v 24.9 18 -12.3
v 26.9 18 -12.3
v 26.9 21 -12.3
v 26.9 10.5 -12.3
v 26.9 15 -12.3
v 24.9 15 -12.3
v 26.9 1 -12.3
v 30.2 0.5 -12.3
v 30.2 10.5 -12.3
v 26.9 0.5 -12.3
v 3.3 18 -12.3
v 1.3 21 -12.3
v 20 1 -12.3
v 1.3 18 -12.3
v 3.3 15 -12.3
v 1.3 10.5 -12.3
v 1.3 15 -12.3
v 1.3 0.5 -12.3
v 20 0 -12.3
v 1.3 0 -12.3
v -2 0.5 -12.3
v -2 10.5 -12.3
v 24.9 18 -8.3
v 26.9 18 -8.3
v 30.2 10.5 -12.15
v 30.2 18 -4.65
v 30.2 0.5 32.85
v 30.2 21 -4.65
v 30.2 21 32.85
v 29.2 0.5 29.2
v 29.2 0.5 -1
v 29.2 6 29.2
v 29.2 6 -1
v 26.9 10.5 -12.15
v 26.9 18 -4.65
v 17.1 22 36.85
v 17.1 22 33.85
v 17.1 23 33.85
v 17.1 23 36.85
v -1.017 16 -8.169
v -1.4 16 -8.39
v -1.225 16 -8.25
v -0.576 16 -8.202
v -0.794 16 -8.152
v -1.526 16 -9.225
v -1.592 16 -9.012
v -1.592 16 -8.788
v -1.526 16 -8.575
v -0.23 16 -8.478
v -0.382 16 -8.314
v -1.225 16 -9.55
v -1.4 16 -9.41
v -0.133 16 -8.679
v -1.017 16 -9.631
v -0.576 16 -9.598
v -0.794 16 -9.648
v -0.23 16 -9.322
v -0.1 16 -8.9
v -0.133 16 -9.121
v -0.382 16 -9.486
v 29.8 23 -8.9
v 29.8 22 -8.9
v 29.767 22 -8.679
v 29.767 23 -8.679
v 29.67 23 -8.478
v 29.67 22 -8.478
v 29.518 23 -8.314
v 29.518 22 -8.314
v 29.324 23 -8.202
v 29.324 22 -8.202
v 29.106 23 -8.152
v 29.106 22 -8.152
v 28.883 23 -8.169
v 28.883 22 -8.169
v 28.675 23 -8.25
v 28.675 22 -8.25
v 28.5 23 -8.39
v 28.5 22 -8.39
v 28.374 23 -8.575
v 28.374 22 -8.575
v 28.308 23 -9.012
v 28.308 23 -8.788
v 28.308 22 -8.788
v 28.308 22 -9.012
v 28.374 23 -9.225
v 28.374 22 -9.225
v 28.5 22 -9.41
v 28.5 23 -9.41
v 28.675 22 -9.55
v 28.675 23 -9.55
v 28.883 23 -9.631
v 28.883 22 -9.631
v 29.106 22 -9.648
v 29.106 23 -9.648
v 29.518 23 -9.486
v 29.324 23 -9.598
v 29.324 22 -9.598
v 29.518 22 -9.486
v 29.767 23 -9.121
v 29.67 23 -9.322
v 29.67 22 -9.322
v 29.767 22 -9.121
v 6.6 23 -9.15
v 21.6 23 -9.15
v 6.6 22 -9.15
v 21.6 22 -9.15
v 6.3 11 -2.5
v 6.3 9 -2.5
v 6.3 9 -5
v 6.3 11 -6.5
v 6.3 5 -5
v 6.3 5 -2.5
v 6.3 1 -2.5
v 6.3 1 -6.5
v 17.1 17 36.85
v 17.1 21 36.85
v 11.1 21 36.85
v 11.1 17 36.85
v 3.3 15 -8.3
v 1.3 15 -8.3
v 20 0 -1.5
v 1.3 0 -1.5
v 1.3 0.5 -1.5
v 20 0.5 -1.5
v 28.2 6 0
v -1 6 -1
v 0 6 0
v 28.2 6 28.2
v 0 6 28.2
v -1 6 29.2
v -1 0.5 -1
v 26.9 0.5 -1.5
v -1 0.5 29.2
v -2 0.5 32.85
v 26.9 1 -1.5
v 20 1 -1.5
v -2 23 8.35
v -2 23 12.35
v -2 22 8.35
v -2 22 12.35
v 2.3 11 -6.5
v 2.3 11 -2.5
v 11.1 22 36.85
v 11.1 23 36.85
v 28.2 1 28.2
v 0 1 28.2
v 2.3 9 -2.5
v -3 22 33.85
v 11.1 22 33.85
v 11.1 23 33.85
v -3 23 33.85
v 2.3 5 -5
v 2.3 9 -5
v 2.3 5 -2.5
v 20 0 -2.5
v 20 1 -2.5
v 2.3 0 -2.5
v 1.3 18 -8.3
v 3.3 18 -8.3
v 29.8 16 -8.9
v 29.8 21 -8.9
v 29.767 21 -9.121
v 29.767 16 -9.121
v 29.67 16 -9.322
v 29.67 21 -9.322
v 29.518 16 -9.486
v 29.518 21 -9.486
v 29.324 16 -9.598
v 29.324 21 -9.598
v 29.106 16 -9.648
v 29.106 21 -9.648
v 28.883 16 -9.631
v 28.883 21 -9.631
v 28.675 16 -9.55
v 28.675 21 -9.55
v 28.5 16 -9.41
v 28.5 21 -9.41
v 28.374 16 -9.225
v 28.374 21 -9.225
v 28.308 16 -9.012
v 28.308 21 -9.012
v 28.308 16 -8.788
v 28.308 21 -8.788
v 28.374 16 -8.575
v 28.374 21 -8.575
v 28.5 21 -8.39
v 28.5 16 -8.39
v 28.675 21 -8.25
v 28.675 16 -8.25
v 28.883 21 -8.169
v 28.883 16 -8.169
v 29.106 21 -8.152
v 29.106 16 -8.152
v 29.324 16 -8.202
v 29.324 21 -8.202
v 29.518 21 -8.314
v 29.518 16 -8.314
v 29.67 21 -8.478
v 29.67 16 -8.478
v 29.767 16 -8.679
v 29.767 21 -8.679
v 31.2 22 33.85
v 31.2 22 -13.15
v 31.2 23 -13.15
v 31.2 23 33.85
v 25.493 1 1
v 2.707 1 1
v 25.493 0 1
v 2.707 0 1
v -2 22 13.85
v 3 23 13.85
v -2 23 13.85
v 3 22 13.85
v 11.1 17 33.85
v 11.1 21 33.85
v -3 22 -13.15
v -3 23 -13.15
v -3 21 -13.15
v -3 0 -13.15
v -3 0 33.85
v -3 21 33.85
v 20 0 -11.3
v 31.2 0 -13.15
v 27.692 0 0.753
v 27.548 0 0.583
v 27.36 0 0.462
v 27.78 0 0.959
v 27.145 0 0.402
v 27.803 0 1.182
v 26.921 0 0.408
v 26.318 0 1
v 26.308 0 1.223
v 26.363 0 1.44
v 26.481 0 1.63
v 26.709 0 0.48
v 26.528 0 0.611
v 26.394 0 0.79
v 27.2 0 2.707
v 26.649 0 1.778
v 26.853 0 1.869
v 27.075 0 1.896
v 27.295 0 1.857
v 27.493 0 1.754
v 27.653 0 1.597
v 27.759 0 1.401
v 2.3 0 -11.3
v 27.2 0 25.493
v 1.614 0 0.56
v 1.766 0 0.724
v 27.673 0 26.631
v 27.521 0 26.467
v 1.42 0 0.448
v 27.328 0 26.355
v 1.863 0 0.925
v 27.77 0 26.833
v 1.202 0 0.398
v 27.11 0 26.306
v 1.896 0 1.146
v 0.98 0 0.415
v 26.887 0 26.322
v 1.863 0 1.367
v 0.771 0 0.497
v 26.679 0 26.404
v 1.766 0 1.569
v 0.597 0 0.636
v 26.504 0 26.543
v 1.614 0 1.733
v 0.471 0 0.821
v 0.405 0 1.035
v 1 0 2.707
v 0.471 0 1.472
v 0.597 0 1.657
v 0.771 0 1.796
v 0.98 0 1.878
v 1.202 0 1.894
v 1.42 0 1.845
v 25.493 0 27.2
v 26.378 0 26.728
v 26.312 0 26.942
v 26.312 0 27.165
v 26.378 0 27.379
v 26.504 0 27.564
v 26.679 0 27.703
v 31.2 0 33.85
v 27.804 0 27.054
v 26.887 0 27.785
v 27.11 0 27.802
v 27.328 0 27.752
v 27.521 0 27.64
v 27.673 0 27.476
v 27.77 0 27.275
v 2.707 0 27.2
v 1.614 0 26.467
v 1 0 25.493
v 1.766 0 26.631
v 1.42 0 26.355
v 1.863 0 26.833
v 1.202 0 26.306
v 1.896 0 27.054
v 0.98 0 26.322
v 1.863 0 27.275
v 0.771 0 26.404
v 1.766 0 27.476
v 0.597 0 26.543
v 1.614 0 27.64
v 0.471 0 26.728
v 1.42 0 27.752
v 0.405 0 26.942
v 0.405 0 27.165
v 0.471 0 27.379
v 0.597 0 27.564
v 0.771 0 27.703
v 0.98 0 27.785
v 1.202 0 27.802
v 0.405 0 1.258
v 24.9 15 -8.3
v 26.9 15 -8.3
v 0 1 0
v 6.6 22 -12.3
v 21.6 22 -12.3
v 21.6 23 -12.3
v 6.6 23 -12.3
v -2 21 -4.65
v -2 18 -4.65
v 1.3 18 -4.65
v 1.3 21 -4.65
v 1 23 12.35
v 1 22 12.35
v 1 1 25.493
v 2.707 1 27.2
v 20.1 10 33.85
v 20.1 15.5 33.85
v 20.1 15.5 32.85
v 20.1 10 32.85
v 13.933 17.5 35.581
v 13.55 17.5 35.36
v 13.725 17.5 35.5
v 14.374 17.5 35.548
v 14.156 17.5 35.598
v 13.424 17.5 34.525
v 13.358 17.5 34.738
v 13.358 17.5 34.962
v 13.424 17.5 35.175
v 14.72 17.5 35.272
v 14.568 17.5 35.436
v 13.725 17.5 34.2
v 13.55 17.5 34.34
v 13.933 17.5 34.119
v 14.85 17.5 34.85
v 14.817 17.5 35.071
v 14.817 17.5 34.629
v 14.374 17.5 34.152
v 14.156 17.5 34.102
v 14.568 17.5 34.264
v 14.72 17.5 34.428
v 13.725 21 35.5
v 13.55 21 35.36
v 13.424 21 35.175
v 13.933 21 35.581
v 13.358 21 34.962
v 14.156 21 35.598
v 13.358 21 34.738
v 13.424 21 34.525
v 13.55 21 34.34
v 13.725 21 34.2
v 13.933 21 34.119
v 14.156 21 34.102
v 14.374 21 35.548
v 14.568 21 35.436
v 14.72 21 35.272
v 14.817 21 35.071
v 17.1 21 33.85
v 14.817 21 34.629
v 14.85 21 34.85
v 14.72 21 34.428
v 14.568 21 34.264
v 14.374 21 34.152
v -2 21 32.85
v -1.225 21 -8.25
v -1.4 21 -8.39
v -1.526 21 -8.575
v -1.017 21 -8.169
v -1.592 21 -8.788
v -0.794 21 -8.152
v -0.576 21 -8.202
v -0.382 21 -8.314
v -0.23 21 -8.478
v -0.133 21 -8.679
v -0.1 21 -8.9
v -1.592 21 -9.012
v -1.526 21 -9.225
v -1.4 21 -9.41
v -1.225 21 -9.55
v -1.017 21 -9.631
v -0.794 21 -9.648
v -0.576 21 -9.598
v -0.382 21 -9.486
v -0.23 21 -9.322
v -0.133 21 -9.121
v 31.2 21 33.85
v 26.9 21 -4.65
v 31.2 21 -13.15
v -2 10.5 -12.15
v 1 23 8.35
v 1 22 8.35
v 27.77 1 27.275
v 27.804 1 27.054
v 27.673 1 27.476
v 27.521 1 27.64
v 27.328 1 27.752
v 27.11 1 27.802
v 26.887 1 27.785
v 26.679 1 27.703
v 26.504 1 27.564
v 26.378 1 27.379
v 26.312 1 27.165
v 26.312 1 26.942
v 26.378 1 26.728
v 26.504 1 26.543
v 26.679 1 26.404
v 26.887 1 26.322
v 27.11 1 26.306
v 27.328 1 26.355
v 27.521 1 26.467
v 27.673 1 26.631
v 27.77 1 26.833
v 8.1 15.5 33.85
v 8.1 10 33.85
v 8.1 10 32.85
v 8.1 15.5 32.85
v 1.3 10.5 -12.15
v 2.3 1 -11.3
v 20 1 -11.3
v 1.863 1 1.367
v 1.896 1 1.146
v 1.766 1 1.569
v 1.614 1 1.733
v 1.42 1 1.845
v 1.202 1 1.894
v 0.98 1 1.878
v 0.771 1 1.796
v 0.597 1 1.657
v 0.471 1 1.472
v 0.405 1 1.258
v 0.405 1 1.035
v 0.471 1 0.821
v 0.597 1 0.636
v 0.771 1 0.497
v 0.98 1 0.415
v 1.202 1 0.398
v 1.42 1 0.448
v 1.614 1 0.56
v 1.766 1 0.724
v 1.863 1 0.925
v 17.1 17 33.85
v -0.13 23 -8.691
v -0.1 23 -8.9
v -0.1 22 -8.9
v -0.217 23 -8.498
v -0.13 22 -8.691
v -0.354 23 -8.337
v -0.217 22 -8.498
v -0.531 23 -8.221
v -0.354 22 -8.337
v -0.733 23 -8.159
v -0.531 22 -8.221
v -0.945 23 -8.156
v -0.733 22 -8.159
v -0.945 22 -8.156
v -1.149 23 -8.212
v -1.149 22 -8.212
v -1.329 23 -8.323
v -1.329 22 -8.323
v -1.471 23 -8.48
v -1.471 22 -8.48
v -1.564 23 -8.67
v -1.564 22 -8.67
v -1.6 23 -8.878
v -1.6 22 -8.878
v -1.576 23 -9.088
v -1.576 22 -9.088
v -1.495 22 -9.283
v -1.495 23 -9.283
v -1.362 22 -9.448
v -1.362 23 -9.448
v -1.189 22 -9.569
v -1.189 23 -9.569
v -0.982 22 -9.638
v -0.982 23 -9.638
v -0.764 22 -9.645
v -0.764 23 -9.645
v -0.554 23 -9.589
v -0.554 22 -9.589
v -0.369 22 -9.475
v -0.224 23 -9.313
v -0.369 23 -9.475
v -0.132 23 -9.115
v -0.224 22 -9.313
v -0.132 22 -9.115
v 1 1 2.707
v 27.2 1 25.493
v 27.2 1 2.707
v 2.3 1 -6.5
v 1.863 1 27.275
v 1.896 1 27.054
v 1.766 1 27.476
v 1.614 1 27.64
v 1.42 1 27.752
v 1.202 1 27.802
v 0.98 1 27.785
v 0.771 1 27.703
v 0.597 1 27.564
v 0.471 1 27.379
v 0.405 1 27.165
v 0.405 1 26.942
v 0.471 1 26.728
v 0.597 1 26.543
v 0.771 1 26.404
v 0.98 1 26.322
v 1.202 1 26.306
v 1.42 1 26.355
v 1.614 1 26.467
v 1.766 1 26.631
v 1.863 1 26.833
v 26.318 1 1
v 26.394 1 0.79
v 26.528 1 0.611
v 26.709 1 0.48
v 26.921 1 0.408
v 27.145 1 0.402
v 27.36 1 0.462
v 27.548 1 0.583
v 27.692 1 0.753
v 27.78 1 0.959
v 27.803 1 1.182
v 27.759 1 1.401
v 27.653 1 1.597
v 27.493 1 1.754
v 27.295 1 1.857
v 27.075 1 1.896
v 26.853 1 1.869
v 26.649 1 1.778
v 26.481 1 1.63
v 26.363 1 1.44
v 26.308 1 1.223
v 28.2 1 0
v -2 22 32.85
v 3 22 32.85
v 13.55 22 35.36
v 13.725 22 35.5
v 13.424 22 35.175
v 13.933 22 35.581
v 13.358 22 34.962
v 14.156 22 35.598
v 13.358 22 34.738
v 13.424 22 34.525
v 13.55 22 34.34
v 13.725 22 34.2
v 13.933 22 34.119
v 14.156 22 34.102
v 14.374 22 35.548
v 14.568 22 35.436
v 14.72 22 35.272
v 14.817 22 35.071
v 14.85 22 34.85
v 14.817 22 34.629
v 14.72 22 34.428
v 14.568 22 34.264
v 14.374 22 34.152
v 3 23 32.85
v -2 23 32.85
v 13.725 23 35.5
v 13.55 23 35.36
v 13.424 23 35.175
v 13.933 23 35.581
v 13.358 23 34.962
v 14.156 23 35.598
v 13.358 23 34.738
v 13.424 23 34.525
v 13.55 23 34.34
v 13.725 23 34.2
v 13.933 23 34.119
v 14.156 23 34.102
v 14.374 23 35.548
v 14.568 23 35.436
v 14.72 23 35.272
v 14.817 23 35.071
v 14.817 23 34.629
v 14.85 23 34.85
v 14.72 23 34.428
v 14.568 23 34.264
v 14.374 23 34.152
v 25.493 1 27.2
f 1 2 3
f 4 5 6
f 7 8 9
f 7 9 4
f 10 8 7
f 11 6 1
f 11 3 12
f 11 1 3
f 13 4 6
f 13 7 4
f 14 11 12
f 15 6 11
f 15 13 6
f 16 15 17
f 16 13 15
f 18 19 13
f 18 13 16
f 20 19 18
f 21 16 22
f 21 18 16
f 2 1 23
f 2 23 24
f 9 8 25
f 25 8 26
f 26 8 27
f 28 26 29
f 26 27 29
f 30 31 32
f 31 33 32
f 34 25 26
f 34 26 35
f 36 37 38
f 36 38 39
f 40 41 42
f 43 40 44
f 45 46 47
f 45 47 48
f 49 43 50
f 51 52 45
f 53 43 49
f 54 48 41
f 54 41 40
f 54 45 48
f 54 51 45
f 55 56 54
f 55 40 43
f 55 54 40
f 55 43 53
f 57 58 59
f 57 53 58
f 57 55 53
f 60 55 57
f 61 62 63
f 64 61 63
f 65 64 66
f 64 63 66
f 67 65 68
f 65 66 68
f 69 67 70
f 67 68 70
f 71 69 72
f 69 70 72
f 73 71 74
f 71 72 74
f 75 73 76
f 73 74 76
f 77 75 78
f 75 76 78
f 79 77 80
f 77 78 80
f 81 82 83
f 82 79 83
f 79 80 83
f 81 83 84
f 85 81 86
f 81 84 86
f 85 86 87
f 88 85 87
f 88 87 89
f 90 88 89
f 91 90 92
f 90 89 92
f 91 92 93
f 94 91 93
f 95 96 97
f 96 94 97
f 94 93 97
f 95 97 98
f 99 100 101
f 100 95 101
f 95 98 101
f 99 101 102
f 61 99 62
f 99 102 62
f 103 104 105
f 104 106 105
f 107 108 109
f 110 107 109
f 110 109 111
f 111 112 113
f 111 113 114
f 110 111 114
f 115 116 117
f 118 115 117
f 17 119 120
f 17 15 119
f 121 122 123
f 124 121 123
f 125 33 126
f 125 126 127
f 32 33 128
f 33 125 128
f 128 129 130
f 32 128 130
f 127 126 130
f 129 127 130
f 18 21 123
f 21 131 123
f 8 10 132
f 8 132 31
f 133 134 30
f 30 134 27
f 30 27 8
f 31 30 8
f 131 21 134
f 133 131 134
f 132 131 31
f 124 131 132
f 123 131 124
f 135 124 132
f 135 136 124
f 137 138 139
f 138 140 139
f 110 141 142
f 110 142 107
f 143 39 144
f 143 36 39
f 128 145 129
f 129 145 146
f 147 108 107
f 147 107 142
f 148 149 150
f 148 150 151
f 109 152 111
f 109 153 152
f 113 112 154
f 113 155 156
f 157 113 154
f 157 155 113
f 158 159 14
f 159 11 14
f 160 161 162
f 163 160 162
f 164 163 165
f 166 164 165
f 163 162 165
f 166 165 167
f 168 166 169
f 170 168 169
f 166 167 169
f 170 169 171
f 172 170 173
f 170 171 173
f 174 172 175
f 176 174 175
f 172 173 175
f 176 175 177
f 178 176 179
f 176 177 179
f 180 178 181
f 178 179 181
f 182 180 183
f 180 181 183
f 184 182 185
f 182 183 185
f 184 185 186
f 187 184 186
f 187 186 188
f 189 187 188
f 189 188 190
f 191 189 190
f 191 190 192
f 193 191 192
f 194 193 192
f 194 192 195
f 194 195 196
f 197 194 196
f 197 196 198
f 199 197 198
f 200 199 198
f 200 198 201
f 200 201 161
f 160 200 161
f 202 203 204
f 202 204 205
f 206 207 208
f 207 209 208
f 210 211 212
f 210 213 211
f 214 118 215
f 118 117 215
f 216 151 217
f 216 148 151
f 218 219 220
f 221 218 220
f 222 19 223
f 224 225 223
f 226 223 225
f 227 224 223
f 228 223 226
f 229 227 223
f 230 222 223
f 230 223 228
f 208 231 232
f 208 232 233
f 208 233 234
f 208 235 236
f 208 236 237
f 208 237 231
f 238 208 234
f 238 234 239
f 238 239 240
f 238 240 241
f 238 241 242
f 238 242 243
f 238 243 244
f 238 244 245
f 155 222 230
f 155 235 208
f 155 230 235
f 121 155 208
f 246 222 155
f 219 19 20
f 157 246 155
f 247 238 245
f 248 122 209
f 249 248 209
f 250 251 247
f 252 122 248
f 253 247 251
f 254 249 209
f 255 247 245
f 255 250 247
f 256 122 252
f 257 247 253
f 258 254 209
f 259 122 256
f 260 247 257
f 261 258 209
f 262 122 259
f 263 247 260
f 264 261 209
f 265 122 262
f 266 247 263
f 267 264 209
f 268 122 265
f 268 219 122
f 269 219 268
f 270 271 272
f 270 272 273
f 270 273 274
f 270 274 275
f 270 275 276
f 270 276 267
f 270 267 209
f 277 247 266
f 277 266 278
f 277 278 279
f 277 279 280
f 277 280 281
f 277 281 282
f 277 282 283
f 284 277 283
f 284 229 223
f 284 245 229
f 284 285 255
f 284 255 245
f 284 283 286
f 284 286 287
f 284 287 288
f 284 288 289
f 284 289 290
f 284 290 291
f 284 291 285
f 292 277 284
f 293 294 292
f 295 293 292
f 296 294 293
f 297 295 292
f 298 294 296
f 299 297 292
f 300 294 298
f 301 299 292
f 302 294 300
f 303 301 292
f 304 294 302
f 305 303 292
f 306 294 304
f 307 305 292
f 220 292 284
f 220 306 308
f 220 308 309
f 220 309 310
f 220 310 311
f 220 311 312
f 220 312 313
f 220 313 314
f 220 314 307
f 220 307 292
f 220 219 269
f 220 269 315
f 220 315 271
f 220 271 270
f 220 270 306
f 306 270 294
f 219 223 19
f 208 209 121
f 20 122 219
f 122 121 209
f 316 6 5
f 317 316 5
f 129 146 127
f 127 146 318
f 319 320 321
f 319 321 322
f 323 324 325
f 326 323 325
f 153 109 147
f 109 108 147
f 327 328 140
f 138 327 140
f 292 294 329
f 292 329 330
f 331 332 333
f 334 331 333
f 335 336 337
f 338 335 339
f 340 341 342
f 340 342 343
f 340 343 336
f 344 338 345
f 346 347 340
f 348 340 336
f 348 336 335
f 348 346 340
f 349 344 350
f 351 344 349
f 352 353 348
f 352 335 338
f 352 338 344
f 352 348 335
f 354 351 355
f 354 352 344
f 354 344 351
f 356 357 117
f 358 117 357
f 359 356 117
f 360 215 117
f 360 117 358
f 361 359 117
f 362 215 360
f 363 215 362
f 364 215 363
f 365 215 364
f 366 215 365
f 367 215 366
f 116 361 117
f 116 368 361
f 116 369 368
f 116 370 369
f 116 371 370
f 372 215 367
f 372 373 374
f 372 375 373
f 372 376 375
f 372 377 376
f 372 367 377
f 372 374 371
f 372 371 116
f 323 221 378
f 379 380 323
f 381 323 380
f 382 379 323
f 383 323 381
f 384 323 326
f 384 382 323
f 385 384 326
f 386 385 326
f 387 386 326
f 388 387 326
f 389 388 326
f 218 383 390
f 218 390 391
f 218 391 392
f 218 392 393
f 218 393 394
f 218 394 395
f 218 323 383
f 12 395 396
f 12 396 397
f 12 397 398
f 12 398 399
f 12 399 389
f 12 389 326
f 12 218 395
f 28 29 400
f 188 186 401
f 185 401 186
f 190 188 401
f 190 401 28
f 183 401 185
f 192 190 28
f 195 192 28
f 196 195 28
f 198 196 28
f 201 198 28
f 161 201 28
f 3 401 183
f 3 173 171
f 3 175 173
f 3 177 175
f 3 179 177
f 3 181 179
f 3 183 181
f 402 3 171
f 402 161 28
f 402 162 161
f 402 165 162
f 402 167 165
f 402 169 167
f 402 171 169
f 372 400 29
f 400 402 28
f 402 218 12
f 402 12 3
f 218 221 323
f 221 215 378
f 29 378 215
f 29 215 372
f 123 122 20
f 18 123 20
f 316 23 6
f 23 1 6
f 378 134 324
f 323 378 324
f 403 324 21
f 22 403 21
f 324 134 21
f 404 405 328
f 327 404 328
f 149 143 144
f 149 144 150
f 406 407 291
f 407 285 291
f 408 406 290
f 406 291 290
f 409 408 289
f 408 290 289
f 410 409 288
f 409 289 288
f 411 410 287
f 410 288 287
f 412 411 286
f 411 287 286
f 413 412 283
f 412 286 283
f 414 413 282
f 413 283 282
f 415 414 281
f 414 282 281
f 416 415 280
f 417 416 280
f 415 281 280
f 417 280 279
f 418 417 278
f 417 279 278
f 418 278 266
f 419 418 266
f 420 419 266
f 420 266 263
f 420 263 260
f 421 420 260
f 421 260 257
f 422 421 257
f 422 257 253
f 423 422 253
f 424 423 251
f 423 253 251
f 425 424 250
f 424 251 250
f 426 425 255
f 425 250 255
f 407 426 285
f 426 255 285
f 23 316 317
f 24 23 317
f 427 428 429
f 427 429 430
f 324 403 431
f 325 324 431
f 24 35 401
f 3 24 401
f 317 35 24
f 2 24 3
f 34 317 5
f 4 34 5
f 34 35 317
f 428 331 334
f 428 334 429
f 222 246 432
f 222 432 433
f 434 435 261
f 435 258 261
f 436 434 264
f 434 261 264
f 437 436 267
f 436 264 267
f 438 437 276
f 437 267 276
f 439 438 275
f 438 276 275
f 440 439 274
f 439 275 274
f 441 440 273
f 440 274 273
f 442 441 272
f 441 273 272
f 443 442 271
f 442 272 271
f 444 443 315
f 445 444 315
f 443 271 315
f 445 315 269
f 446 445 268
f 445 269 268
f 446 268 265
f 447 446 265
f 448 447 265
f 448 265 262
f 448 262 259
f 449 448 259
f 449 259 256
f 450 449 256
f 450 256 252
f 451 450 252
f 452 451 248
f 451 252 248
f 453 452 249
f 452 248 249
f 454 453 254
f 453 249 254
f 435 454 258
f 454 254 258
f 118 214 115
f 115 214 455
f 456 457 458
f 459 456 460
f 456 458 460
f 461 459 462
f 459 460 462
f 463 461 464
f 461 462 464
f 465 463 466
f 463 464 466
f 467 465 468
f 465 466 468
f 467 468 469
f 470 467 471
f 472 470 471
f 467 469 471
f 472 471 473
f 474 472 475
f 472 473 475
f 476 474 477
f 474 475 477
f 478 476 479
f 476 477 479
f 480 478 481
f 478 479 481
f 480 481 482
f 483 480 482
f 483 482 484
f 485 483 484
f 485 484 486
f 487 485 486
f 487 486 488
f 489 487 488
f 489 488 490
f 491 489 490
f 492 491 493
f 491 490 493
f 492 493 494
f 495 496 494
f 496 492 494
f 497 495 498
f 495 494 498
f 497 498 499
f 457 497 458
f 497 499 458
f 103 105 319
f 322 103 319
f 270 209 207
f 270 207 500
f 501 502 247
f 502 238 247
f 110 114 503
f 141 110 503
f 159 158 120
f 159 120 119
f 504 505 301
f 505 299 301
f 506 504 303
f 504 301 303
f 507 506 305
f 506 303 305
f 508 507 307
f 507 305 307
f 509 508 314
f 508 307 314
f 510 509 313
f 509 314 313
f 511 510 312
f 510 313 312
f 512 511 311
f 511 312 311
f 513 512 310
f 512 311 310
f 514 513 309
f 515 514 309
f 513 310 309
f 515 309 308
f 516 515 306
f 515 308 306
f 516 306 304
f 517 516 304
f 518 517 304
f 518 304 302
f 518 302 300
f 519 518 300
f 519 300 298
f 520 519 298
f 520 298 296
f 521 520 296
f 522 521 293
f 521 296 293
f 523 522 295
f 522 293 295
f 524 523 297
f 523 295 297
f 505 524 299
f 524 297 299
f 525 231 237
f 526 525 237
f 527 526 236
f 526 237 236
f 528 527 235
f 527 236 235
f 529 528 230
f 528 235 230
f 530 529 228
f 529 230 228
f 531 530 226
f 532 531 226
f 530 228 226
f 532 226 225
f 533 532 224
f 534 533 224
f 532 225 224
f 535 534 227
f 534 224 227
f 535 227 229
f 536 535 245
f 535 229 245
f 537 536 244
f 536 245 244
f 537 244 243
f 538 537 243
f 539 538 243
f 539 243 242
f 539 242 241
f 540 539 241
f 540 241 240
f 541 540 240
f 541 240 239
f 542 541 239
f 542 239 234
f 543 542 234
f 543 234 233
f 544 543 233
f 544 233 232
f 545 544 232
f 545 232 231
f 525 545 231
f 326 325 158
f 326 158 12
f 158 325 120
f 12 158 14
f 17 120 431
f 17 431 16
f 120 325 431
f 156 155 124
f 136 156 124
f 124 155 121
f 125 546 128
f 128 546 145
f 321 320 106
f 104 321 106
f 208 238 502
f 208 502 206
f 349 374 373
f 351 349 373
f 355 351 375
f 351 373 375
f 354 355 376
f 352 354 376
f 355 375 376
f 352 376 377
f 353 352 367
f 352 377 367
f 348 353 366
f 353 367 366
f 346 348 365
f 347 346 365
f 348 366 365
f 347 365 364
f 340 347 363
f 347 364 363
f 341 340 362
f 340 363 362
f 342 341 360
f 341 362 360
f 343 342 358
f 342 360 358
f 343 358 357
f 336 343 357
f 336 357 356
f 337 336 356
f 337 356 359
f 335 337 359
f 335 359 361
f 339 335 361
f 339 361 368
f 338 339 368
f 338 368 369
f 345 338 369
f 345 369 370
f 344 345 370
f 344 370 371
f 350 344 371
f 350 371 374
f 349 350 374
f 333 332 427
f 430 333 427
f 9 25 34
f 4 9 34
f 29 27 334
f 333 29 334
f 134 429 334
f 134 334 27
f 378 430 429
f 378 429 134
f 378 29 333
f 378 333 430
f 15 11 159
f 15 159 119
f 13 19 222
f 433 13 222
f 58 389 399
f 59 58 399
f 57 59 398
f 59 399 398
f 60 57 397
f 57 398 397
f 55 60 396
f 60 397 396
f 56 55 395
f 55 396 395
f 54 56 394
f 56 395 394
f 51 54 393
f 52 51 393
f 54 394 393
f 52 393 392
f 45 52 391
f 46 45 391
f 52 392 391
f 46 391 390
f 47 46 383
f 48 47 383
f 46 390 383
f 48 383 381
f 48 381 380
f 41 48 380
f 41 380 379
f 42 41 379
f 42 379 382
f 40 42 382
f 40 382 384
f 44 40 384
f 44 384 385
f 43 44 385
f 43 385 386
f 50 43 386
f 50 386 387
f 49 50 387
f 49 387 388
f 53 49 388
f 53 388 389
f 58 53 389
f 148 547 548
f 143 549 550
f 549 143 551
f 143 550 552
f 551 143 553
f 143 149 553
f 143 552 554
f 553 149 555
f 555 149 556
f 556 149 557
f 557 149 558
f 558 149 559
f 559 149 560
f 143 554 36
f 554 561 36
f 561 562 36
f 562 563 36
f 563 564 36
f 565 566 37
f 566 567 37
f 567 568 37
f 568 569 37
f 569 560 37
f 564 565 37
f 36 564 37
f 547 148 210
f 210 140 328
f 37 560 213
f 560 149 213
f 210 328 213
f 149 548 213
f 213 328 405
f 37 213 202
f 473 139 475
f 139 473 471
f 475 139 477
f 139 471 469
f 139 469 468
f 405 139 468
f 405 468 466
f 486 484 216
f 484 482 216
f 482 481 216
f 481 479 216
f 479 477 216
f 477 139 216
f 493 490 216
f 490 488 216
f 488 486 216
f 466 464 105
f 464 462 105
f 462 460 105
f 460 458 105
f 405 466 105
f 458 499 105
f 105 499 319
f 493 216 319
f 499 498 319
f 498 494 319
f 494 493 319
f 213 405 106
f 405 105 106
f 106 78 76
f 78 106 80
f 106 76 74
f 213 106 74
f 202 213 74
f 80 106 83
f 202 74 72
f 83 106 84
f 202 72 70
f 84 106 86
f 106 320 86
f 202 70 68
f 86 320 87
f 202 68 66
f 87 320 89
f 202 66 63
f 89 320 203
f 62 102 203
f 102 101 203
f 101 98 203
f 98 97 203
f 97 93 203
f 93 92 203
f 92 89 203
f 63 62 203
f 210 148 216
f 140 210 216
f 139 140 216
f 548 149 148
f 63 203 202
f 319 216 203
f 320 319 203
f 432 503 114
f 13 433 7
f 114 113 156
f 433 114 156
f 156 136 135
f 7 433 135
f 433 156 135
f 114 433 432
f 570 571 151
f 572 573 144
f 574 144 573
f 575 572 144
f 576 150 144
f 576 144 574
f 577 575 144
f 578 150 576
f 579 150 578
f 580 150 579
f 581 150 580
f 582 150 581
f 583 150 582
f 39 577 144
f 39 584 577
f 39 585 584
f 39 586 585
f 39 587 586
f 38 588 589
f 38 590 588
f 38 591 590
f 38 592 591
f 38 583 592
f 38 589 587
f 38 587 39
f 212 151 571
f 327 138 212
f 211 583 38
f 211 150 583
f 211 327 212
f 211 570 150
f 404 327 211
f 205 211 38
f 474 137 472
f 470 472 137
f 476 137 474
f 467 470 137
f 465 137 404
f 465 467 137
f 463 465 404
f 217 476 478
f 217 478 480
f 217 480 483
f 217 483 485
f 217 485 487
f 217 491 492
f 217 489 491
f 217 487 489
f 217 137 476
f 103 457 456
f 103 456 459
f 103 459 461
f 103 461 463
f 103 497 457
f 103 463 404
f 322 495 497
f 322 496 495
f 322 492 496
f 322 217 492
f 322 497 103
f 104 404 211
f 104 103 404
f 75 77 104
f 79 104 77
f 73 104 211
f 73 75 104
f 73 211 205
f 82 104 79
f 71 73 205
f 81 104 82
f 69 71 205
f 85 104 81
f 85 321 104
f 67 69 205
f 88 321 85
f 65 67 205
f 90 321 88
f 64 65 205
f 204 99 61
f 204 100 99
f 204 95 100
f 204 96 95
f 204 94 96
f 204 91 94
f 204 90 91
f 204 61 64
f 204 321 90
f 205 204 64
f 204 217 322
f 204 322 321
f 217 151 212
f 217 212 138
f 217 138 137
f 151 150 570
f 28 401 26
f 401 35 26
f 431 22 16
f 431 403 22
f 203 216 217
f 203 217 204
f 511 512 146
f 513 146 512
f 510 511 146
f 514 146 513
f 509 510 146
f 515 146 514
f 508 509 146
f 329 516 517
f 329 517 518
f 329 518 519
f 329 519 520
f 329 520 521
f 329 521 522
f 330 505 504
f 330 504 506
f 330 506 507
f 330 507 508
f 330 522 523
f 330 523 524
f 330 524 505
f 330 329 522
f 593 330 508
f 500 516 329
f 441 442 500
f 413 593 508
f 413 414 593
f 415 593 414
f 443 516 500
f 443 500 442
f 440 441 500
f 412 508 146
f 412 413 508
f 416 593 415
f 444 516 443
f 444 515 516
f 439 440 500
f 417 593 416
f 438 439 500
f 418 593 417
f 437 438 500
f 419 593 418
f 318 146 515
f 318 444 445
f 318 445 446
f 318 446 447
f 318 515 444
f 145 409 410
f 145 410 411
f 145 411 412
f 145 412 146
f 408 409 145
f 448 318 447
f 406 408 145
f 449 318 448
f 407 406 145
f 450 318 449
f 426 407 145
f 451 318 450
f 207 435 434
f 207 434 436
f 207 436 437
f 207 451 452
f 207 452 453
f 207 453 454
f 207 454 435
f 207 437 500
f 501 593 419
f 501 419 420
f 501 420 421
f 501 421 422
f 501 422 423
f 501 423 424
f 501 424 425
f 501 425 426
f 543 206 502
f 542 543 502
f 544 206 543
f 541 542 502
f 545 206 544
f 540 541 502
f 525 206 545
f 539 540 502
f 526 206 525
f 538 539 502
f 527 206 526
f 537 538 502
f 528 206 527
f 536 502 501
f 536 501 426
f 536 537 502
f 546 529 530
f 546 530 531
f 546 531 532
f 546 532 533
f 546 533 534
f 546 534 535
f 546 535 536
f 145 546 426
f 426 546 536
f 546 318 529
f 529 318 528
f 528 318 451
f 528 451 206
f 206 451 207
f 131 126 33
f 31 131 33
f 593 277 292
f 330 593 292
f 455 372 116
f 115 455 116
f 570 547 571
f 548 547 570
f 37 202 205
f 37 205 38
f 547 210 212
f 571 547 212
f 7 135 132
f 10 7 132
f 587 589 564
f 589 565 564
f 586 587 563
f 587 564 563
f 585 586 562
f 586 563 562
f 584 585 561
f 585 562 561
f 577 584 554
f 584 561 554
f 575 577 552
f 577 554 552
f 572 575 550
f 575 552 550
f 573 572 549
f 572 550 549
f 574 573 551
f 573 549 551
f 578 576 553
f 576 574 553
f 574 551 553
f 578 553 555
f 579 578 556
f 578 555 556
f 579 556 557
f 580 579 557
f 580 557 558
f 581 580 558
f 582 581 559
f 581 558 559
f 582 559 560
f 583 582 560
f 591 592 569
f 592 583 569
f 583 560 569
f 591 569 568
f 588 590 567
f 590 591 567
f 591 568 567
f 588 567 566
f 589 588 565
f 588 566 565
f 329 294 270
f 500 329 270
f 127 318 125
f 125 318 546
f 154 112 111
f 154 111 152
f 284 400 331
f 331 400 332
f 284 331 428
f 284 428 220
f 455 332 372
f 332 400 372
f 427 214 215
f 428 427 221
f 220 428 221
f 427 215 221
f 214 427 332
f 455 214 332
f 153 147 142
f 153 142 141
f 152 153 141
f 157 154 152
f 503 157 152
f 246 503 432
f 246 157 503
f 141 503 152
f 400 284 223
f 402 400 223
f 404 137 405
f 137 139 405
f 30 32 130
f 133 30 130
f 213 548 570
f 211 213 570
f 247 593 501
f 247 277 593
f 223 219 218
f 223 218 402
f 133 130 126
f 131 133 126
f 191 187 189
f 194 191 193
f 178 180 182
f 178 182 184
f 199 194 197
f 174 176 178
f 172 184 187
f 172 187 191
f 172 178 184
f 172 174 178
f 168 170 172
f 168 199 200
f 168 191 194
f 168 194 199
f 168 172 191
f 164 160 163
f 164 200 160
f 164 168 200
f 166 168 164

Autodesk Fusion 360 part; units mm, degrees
sketch "Sketch1" plane through (0, 0, 0) normal (0, 1, 0) x (1, 0, 0)
  line L0 (0, 0) -> (28.2, 0)
  line L1 (28.2, 0) -> (28.2, -28.2)
  line L2 (28.2, -28.2) -> (0, -28.2)
  line L3 (0, -28.2) -> (0, 0)
  line L4 (29.7, -29.7) -> (-1.5, -29.7)
  line L5 (-1.5, -29.7) -> (-1.5, 1.5)
  line L6 (-1.5, 1.5) -> (29.7, 1.5)
  line L7 (29.7, 1.5) -> (29.7, -29.7)
  line L8 (26.7, -1.5) -> (26.3464, -1.8536) construction
  line L9 (26.3464, -1.8536) -> (26.7, -2.2071) construction
  line L10 (26.7, -2.2071) -> (25.9929, -1.5)
  line L11 (26.7, -1.5) -> (27.0536, -1.1464) construction
  circle A0 centre (27.0536, -1.1464) radius 0.75
  line L12 (26.7, -26.7) -> (1.5, -1.5) construction
  line L13 (1.5, -26.7) -> (26.7, -1.5) construction
  circle A1 centre (1.1464, -1.1464) radius 0.75
  circle A2 centre (1.1464, -27.0536) radius 0.75
  circle A3 centre (27.0536, -27.0536) radius 0.75
  line L14 (27.2, -27.2) -> (1, -27.2)
  line L15 (1, -27.2) -> (1, -1)
  line L16 (1, -1) -> (27.2, -1)
  line L17 (27.2, -1) -> (27.2, -27.2)
  line L18 (27.2, -2.7071) -> (25.4929, -1)
  line L19 (2.7071, -1) -> (1, -2.7071)
  line L20 (1, -25.4929) -> (2.7071, -27.2)
  line L21 (25.4929, -27.2) -> (27.2, -25.4929)
  dimension "d1" = 28.2
  dimension "d2" = 28.2
  dimension "d5" = 1.5
  dimension "d12" = 1.5
  dimension "d15" = 1
  dimension "d17" = 360
extrude "Extrude1" add sketch "Sketch1" along normal blind 1 contours L0 L1 L2 L3 | L4 L5 L6 L7 | A3 L14 L17 L21 | A1 L15 L16 L19 | A2 L14 L15 L20 makes body 1
extrude "Extrude2" add sketch "Sketch1" along normal blind 5 contours L4 L5 L6 L7 bodies 1
extrude "Extrude3" add sketch "Sketch1" along normal blind 1 contours L10 A0 L16 L17 L18 bodies 1
extrude "Extrude4" add 1 faces at (-1, 5, 9.4) along direction (0, 1, 0) blind 1 on bodies 1 bodies 1
ref_plane "WorkPlane1" through (14.1, 6, 14.1) normal (0, 1, 0) x (0, 0, 1)
sketch "Sketch2" plane through (14.1, 6, 14.1) normal (0, 1, 0) x (1, 0, 0)
  line L0 (15.6, -15.6) -> (-15.6, -15.6)
  line L1 (15.6, -15.6) -> (15.6, -26) construction
  line L2 (15.6, -18.25) -> (-15.6, -18.25)
  line L3 (-15.6, -18.25) -> (-15.6, 18.25)
  line L4 (-15.6, 18.25) -> (15.6, 18.25)
  line L5 (15.6, 18.25) -> (15.6, -18.25)
  line L6 (15.6, -18.25) -> (-15.6, 18.25) construction
  line L7 (-15.6, -18.25) -> (15.6, 18.25) construction
  line L8 (16.1, -18.75) -> (-16.1, -18.75)
  line L9 (-16.1, -18.75) -> (-16.1, 18.75)
  line L10 (-16.1, 18.75) -> (16.1, 18.75)
  line L11 (16.1, 18.75) -> (16.1, -18.75)
  line L12 (17.1, -19.75) -> (-17.1, -19.75)
  line L13 (-17.1, -19.75) -> (-17.1, 19.75)
  line L14 (-17.1, 19.75) -> (17.1, 19.75)
  line L15 (17.1, 19.75) -> (17.1, -19.75)
  line L16 (-12.8, 25.4) -> (-12.8, -15.6)
  line L17 (-12.8, -15.6) -> (12.8, -15.6)
  line L18 (12.8, -15.6) -> (12.8, 25.4)
  line L19 (17.1, 19.75) -> (-17.1, 19.75)
  line L20 (-17.1, 19.75) -> (-17.1, 27.25)
  line L21 (-17.1, 27.25) -> (17.1, 27.25)
  line L22 (17.1, 27.25) -> (17.1, 19.75)
  line L23 (-12.8, 25.4) -> (12.8, 25.4)
  line L24 (12.8, 25.4) -> (12.8, 26.4)
  line L25 (12.8, 26.4) -> (-12.8, 26.4)
  line L26 (-12.8, 26.4) -> (-12.8, 25.4)
  dimension "d27" = 31.2
  dimension "d28" = 36.5
  dimension "d29" = 0.5
  dimension "d30" = 1.5
  dimension "d33" = 41
  dimension "d34" = 25.6
  dimension "d35" = 7.5
  dimension "d36" = 1
extrude "Extrude5" add sketch "Sketch2" against normal blind 6 separate body contours L8 L9 L10 L11 L12 L13 L14 L15 L16 L18 L19 | L14 L16 L18 L19 L20 L21 L22 L24 L25 L26 makes body 2
extrude "Extrude6" add 1 faces at (-1.5667, 6, -10.0333) along direction (0, 1, 0) blind 13 on bodies 2 bodies 2
extrude "Extrude7" add 1 faces at (-1.5, 2, 19.3) along direction (-1, 0, 0) blind 1.5 on bodies 1 bodies 1 2
extrude "Extrude8" add 1 faces at (29.7, 4, 19.3) along direction (1, 0, 0) blind 1.5 on bodies 1 bodies 1
ref_plane "WorkPlane2" through (14.1, 0, 10.35) normal (0, -1, 0) x (-1, 0, 0)
sketch "Sketch3" plane through (14.1, 0, 10.35) normal (0, -1, 0) x (1, 0, 0)
  line L0 (-17.1, -23.5) -> (17.1, -23.5)
  line L1 (17.1, -23.5) -> (17.1, 23.5)
  line L2 (17.1, 23.5) -> (-17.1, 23.5)
  line L3 (-17.1, 23.5) -> (-17.1, -23.5)
  line L4 (-12.8, -22.65) -> (12.8, -22.65)
  line L5 (12.8, -22.65) -> (12.8, -11.85)
  line L6 (12.8, -11.85) -> (-12.8, -11.85)
  line L7 (-12.8, -11.85) -> (-12.8, -22.65)
  line L8 (12.8, -22.65) -> (-12.8, -22.65)
  line L9 (0, -22.65) -> (0, -11.85)
  line L10 (-11.8, -21.65) -> (11.8, -21.65)
  line L11 (11.8, -21.65) -> (11.8, -12.85)
  line L12 (11.8, -12.85) -> (-11.8, -12.85)
  line L13 (-11.8, -12.85) -> (-11.8, -21.65)
  line L14 (-16.1, 19.35) -> (16.1, 19.35)
  line L15 (16.1, 19.35) -> (16.1, -11.85)
  line L16 (16.1, -11.85) -> (-16.1, -11.85)
  line L17 (-16.1, -11.85) -> (-16.1, 19.35)
  line L18 (-11.8, -12.85) -> (-7.8, -12.85)
  line L19 (-7.8, -12.85) -> (-7.8, -16.85)
  line L20 (-7.8, -16.85) -> (-11.8, -16.85)
  line L21 (-11.8, -16.85) -> (-11.8, -12.85)
  line L22 (0, -21.65) -> (11.8, -12.85) construction
  line L23 (5.9, -17.25) -> (5.9, -21.65) construction
  line L24 (5.9, -21.65) -> (5.9, -22.65) construction
  line L25 (5.9, -22.65) -> (5.9, -11.85)
  dimension "d46" = 1
  dimension "d53" = 4
  dimension "d54" = 4
extrude "Extrude9" add sketch "Sketch3" against normal blind 0.5 contours L0 L1 L2 L3 | L4 L8 L9 L10 L25 | L4 L5 L6 L8 L10 L11 L12 L16 L25 | L9 L10 L12 L13 L19 L20 | L9 L10 L12 L25 | L6 L9 L12 L16 L25 | L10 L11 L12 L25 | L12 L13 L18 L19 L20 L21 bodies 1
extrude "Extrude10" add sketch "Sketch3" against normal blind 1 contours L9 L10 L12 L13 L19 L20 | L12 L13 L18 L19 L20 L21 bodies 1
extrude "Extrude11" add sketch "Sketch3" against normal blind 1 contours L4 L8 L9 L10 L25 | L4 L5 L6 L8 L10 L11 L12 L16 L25 | L9 L10 L12 L25 | L6 L9 L12 L16 L25 | L10 L11 L12 L25 bodies 1
extrude "Extrude12" add sketch "Sketch3" against normal blind 6 contours L12 L13 L18 L19 L20 L21 bodies 1
extrude "Extrude13" add 1 faces at (-1.2333, 19, -10.0333) along direction (0, 1, 0) blind 2 on bodies 1 bodies 1
ref_plane "WorkPlane3" through (14.1, 21, 10.35) normal (0, 1, 0) x (0, 0, 1)
sketch "Sketch4" plane through (14.1, 21, 10.35) normal (0, 1, 0) x (1, 0, 0)
  line L0 (17.1, -23.5) -> (-17.1, -23.5)
  line L1 (-17.1, -23.5) -> (-17.1, 23.5)
  line L2 (-17.1, 23.5) -> (17.1, 23.5)
  line L3 (17.1, 23.5) -> (17.1, -23.5)
  line L4 (-12.8, 15) -> (-17.1, 23.5)
  circle A0 centre (-14.95, 19.25) radius 0.75
  line L5 (16.1, 15) -> (16.1, -22.5)
  line L6 (0, 0) -> (0, -7)
  circle A1 centre (14.95, 19.25) radius 0.75
  line L7 (3, -26.5) -> (-3, -26.5)
  line L8 (-3, -26.5) -> (-3, -20.5)
  line L9 (-3, -20.5) -> (3, -20.5)
  line L10 (3, -20.5) -> (3, -26.5)
  line L11 (3, -26.5) -> (-3, -20.5) construction
  line L12 (-3, -26.5) -> (3, -20.5) construction
  line L13 (16.1, -22.5) -> (-16.1, -22.5) construction
  line L14 (0, -22.5) -> (0, -26.5) construction
  circle A2 centre (0, -24.5) radius 0.75
  line L15 (-17.1, -23.5) -> (-11.1, -23.5)
  line L16 (-11.1, -23.5) -> (-11.1, -8.5)
  line L17 (-11.1, -8.5) -> (-17.1, -8.5)
  line L18 (-17.1, -8.5) -> (-17.1, -23.5)
  line L19 (-16.1, -22.5) -> (-11.1, -22.5)
  line L20 (-11.1, -22.5) -> (-11.1, -8.5)
  line L21 (-11.1, -8.5) -> (-16.1, -8.5)
  line L22 (-16.1, -8.5) -> (-16.1, -22.5)
  line L23 (-7.5, 27.5) -> (7.5, 27.5)
  line L24 (7.5, 27.5) -> (7.5, 19.5)
  line L25 (7.5, 19.5) -> (-7.5, 19.5)
  line L26 (-7.5, 19.5) -> (-7.5, 27.5)
  line L27 (-7.5, 27.5) -> (7.5, 19.5) construction
  line L28 (7.5, 27.5) -> (-7.5, 19.5) construction
  line L29 (-21.1, 2) -> (-13.1, 2)
  line L30 (-13.1, 2) -> (-13.1, -2)
  line L31 (-13.1, -2) -> (-21.1, -2)
  line L32 (-21.1, -2) -> (-21.1, 2)
  line L33 (-21.1, 2) -> (-13.1, -2) construction
  line L34 (-13.1, 2) -> (-21.1, -2) construction
  line L35 (-16.1, 2) -> (-17.1, 2)
  line L36 (-17.1, 2) -> (-17.1, -2)
  line L37 (-17.1, -2) -> (-16.1, -2)
  line L38 (-16.1, -2) -> (-16.1, 2)
  line L39 (7.5, 22.65) -> (-7.5, 22.65)
  line L40 (-7.5, 22.65) -> (-7.5, 23.5)
  line L41 (-7.5, 23.5) -> (7.5, 23.5)
  line L42 (7.5, 23.5) -> (7.5, 22.65)
  dimension "d60" = 1.5
  dimension "d61" = 6
  dimension "d62" = 6
  dimension "d63" = 1.5
  dimension "d91" = 6
  dimension "d92" = 15
  dimension "d93" = 8
  dimension "d94" = 15
  dimension "d95" = 8
  dimension "d96" = 4
extrude "Extrude14" add sketch "Sketch4" against normal blind 4 contours L0 L7 L8 L10 | A2 bodies 1
extrude "Extrude15" cut sketch "Sketch4" against normal blind 3.5 contours A2 bodies 1
extrude "Extrude16" cut sketch "Sketch4" against normal blind 5 contours L4 A0 | L4 A0 | A1 bodies 1
extrude "Extrude17" add sketch "Sketch4" along normal blind 2 and the other way blind -1 separate body contours L0 L1 L2 L3 L8 L9 L10 L16 L17 L20 L21 L24 L25 L26 L29 L30 L31 L35 L37 L40 L42 | L0 L1 L15 L16 L17 L18 L19 L22 | L0 L8 L9 L10 | L0 L7 L8 L10 | L16 L17 L19 L20 L21 L22 | L1 L29 L31 L35 L36 L37 L38 | L29 L30 L31 L38 | L2 L24 L26 L39 L40 L41 L42 | L24 L25 L26 L39 makes body 3
extrude "Extrude18" add 1 faces at (4.9667, 6, -3.8333) along direction (0, 1, 0) blind 5 on bodies 1 bodies 1
extrude "Extrude19" cut sketch "Sketch3" against normal blind 1 contours L4 L8 L9 L10 L25 | L6 L9 L12 L16 L25 bodies 1
sketch "Sketch5" plane through (0, 0, -2.5) normal (0, 0, 1) x (1, 0, 0)
  line L0 (2.3, 0) -> (20, 0)
  line L1 (20, 0) -> (20, 1)
  line L2 (20, 1) -> (6.3, 1)
  line L3 (6.3, 1) -> (6.3, 11)
  line L4 (6.3, 11) -> (2.3, 11)
  line L5 (2.3, 11) -> (2.3, 0)
  line L6 (2.3, 11) -> (6.3, 11)
  line L7 (6.3, 11) -> (6.3, 9)
  line L8 (6.3, 9) -> (2.3, 9)
  line L9 (2.3, 9) -> (2.3, 11)
  line L10 (2.3, 9) -> (6.3, 9)
  line L11 (6.3, 9) -> (6.3, 5)
  line L12 (6.3, 5) -> (2.3, 5)
  line L13 (2.3, 5) -> (2.3, 9)
  dimension "d78" = 2
  dimension "d79" = 4
  dimension "d80" = 4
extrude "Extrude20" cut sketch "Sketch5" against normal blind 2.5 contours L3 L5 L8 L10 L11 L12 L13 bodies 1
ref_plane "WorkPlane4" through (14.1, 19, 36.85) normal (0, 0, 1) x (-1, 0, 0)
sketch "Sketch6" plane through (14.1, 19, 36.85) normal (0, 0, 1) x (1, 0, 0)
  line L0 (-3, -2) -> (3, -2)
  line L1 (3, -2) -> (3, 2)
  line L2 (3, 2) -> (-3, 2)
  line L3 (-3, 2) -> (-3, -2)
  line L4 (-3, -2) -> (-6, -2)
  line L5 (-6, -2) -> (6, -2)
  line L6 (-6, -2) -> (6, -2)
  line L7 (6, -2) -> (6, -2.5)
  line L8 (6, -2.5) -> (-6, -2.5)
  line L9 (-6, -2.5) -> (-6, -2)
  line L10 (-6, -2.5) -> (6, -2.5)
  line L11 (6, -2.5) -> (6, -7.5)
  line L12 (6, -7.5) -> (-6, -7.5)
  line L13 (-6, -7.5) -> (-6, -2.5)
  dimension "d84" = 3
  dimension "d99" = 12
  dimension "d100" = 0.5
  dimension "d101" = 5
  dimension "d102" = 12
extrude "Extrude22" cut sketch "Sketch4" along normal blind 5.438 contours L16 L17 L19 L20 L21 L22 | L29 L30 L31 L38 | L24 L25 L26 L39 bodies 3
extrude "Extrude23" cut sketch "Sketch6" against normal blind 4.467 contours L8 L10 L11 L12 L13 bodies 1
ref_plane "WorkPlane5" through (14.1, 6, 14.1) normal (0, 1, 0) x (0, 0, 1)
sketch "Sketch7" plane through (14.1, 6, 14.1) normal (0, 1, 0) x (1, 0, 0)
  line L0 (-14.1, 14.1) -> (14.1, 14.1)
  line L1 (14.1, 14.1) -> (14.1, -14.1)
  line L2 (14.1, -14.1) -> (-14.1, -14.1)
  line L3 (-14.1, -14.1) -> (-14.1, 14.1)
  line L4 (-16.1, 15.6) -> (16.1, 15.6)
  line L5 (16.1, 15.6) -> (16.1, -15.6)
  line L6 (16.1, -15.6) -> (-16.1, -15.6)
  line L7 (-16.1, -15.6) -> (-16.1, 15.6)
  line L8 (15.1, 15.1) -> (15.1, -15.1)
  line L9 (15.1, -15.1) -> (-15.1, -15.1)
  line L10 (-15.1, -15.1) -> (-15.1, 15.1)
  line L11 (-15.1, 15.1) -> (15.1, 15.1)
  dimension "d106" = 1
extrude "Extrude24" cut sketch "Sketch7" against normal blind 5.5 contours L4 L5 L6 L7 bodies 1
sketch "Sketch8" plane through (0, 0, -4.65) normal (0, 0, 1) x (1, 0, 0)
  line L0 (26.9, 0.5) -> (30.2, 0.5)
  line L1 (30.2, 0.5) -> (30.2, 21)
  line L2 (30.2, 21) -> (26.9, 21)
  line L3 (26.9, 21) -> (26.9, 1)
  line L4 (26.9, 1) -> (26.9, 0.5)
  line L5 (30.2, 21) -> (-2, 21)
  line L6 (-2, 21) -> (-2, 0)
  line L7 (-2, 0) -> (30.2, 0)
  line L8 (30.2, 0) -> (30.2, 21)
  line L9 (14.1, 21) -> (14.1, 18)
  line L10 (26.9, 0.5) -> (30.2, 0.5)
  line L11 (30.2, 0.5) -> (30.2, 10.5)
  line L12 (30.2, 10.5) -> (26.9, 10.5)
  line L13 (26.9, 10.5) -> (26.9, 0.5)
  line L14 (-2, 10.5) -> (1.3, 10.5)
  line L15 (1.3, 10.5) -> (1.3, 0.5)
  line L16 (1.3, 0.5) -> (-2, 0.5)
  line L17 (-2, 0.5) -> (-2, 10.5)
extrude "Extrude25" cut sketch "Sketch8" against normal blind 7.65 contours L0 L1 L3 L4 L8 L10 L11 L12 L13 | L6 L14 L15 L16 L17 bodies 1
chamfer "Chamfer1" distance 7.5 angle 45 1 edges at (28.55, 10.5, -4.65) on bodies 1
chamfer "Chamfer2" distance 7.5 angle 45 1 edges at (-0.35, 10.5, -4.65) on bodies 1
extrude "Extrude26" cut 1 faces at (16.1, 11.5, 33.5167) along direction (0, -1, 0) blind 1.5 on bodies 1 bodies 1
extrude "Extrude27" add 1 faces at (16.1, 16.5, 33.5167) along direction (0, -1, 0) blind 1 on bodies 1 bodies 1
extrude "Extrude28" cut 1 faces at (1.3333, 22.3333, 18.85) along direction (0, 0, -1) blind 5 on bodies 3 bodies 3
ref_plane "WorkPlane6" through (14.1, 10.5, -13.15) normal (0, 0, -1) x (1, 0, 0)
sketch "Sketch9" plane through (14.1, 10.5, -13.15) normal (0, 0, -1) x (1, 0, 0)
  line L0 (17.1, -10.5) -> (-17.1, -10.5)
  line L1 (-17.1, -10.5) -> (-17.1, 10.5)
  line L2 (-17.1, 10.5) -> (17.1, 10.5)
  line L3 (17.1, 10.5) -> (17.1, -10.5)
  line L4 (17.1, -10.5) -> (12.8, -10.5)
  line L5 (12.8, -10.5) -> (12.8, 10.5)
  line L6 (12.8, 10.5) -> (17.1, 10.5)
  line L7 (17.1, 10.5) -> (17.1, -10.5)
  line L8 (-17.1, -10.5) -> (-12.8, -10.5)
  line L9 (-12.8, -10.5) -> (-12.8, 10.5)
  line L10 (-12.8, 10.5) -> (-17.1, 10.5)
  line L11 (-17.1, 10.5) -> (-17.1, -10.5)
  line L12 (12.8, -10.5) -> (10.8, -10.5)
  line L13 (10.8, -10.5) -> (10.8, -4.5)
  line L14 (10.8, -4.5) -> (12.8, -4.5)
  line L15 (12.8, -4.5) -> (12.8, -10.5)
  line L16 (12.8, -4.5) -> (10.8, -4.5)
  line L17 (10.8, -4.5) -> (10.8, -7.5)
  line L18 (10.8, -7.5) -> (12.8, -7.5)
  line L19 (12.8, -7.5) -> (12.8, -4.5)
  line L20 (6, 0.5) -> (-6, 0.5)
  line L21 (0, 0) -> (0, -3.5099)
  line L22 (-10.8, -7.5) -> (-12.8, -7.5)
  line L23 (-10.8, -10.5) -> (-10.8, -4.5)
  line L24 (-10.8, -4.5) -> (-12.8, -4.5)
  line L25 (-12.8, -10.5) -> (-12.8, 10.5)
  dimension "d120" = 4.3
  dimension "d121" = 4.3
  dimension "d122" = 6
  dimension "d123" = 2
  dimension "d124" = 3
extrude "Extrude29" add sketch "Sketch9" against normal blind 4.85 contours L5 L13 L14 L15 L16 L17 L18 L19 | L9 L22 L23 L24 L25 bodies 1
equation "d125 = -4 mm - 0.85 mm"
